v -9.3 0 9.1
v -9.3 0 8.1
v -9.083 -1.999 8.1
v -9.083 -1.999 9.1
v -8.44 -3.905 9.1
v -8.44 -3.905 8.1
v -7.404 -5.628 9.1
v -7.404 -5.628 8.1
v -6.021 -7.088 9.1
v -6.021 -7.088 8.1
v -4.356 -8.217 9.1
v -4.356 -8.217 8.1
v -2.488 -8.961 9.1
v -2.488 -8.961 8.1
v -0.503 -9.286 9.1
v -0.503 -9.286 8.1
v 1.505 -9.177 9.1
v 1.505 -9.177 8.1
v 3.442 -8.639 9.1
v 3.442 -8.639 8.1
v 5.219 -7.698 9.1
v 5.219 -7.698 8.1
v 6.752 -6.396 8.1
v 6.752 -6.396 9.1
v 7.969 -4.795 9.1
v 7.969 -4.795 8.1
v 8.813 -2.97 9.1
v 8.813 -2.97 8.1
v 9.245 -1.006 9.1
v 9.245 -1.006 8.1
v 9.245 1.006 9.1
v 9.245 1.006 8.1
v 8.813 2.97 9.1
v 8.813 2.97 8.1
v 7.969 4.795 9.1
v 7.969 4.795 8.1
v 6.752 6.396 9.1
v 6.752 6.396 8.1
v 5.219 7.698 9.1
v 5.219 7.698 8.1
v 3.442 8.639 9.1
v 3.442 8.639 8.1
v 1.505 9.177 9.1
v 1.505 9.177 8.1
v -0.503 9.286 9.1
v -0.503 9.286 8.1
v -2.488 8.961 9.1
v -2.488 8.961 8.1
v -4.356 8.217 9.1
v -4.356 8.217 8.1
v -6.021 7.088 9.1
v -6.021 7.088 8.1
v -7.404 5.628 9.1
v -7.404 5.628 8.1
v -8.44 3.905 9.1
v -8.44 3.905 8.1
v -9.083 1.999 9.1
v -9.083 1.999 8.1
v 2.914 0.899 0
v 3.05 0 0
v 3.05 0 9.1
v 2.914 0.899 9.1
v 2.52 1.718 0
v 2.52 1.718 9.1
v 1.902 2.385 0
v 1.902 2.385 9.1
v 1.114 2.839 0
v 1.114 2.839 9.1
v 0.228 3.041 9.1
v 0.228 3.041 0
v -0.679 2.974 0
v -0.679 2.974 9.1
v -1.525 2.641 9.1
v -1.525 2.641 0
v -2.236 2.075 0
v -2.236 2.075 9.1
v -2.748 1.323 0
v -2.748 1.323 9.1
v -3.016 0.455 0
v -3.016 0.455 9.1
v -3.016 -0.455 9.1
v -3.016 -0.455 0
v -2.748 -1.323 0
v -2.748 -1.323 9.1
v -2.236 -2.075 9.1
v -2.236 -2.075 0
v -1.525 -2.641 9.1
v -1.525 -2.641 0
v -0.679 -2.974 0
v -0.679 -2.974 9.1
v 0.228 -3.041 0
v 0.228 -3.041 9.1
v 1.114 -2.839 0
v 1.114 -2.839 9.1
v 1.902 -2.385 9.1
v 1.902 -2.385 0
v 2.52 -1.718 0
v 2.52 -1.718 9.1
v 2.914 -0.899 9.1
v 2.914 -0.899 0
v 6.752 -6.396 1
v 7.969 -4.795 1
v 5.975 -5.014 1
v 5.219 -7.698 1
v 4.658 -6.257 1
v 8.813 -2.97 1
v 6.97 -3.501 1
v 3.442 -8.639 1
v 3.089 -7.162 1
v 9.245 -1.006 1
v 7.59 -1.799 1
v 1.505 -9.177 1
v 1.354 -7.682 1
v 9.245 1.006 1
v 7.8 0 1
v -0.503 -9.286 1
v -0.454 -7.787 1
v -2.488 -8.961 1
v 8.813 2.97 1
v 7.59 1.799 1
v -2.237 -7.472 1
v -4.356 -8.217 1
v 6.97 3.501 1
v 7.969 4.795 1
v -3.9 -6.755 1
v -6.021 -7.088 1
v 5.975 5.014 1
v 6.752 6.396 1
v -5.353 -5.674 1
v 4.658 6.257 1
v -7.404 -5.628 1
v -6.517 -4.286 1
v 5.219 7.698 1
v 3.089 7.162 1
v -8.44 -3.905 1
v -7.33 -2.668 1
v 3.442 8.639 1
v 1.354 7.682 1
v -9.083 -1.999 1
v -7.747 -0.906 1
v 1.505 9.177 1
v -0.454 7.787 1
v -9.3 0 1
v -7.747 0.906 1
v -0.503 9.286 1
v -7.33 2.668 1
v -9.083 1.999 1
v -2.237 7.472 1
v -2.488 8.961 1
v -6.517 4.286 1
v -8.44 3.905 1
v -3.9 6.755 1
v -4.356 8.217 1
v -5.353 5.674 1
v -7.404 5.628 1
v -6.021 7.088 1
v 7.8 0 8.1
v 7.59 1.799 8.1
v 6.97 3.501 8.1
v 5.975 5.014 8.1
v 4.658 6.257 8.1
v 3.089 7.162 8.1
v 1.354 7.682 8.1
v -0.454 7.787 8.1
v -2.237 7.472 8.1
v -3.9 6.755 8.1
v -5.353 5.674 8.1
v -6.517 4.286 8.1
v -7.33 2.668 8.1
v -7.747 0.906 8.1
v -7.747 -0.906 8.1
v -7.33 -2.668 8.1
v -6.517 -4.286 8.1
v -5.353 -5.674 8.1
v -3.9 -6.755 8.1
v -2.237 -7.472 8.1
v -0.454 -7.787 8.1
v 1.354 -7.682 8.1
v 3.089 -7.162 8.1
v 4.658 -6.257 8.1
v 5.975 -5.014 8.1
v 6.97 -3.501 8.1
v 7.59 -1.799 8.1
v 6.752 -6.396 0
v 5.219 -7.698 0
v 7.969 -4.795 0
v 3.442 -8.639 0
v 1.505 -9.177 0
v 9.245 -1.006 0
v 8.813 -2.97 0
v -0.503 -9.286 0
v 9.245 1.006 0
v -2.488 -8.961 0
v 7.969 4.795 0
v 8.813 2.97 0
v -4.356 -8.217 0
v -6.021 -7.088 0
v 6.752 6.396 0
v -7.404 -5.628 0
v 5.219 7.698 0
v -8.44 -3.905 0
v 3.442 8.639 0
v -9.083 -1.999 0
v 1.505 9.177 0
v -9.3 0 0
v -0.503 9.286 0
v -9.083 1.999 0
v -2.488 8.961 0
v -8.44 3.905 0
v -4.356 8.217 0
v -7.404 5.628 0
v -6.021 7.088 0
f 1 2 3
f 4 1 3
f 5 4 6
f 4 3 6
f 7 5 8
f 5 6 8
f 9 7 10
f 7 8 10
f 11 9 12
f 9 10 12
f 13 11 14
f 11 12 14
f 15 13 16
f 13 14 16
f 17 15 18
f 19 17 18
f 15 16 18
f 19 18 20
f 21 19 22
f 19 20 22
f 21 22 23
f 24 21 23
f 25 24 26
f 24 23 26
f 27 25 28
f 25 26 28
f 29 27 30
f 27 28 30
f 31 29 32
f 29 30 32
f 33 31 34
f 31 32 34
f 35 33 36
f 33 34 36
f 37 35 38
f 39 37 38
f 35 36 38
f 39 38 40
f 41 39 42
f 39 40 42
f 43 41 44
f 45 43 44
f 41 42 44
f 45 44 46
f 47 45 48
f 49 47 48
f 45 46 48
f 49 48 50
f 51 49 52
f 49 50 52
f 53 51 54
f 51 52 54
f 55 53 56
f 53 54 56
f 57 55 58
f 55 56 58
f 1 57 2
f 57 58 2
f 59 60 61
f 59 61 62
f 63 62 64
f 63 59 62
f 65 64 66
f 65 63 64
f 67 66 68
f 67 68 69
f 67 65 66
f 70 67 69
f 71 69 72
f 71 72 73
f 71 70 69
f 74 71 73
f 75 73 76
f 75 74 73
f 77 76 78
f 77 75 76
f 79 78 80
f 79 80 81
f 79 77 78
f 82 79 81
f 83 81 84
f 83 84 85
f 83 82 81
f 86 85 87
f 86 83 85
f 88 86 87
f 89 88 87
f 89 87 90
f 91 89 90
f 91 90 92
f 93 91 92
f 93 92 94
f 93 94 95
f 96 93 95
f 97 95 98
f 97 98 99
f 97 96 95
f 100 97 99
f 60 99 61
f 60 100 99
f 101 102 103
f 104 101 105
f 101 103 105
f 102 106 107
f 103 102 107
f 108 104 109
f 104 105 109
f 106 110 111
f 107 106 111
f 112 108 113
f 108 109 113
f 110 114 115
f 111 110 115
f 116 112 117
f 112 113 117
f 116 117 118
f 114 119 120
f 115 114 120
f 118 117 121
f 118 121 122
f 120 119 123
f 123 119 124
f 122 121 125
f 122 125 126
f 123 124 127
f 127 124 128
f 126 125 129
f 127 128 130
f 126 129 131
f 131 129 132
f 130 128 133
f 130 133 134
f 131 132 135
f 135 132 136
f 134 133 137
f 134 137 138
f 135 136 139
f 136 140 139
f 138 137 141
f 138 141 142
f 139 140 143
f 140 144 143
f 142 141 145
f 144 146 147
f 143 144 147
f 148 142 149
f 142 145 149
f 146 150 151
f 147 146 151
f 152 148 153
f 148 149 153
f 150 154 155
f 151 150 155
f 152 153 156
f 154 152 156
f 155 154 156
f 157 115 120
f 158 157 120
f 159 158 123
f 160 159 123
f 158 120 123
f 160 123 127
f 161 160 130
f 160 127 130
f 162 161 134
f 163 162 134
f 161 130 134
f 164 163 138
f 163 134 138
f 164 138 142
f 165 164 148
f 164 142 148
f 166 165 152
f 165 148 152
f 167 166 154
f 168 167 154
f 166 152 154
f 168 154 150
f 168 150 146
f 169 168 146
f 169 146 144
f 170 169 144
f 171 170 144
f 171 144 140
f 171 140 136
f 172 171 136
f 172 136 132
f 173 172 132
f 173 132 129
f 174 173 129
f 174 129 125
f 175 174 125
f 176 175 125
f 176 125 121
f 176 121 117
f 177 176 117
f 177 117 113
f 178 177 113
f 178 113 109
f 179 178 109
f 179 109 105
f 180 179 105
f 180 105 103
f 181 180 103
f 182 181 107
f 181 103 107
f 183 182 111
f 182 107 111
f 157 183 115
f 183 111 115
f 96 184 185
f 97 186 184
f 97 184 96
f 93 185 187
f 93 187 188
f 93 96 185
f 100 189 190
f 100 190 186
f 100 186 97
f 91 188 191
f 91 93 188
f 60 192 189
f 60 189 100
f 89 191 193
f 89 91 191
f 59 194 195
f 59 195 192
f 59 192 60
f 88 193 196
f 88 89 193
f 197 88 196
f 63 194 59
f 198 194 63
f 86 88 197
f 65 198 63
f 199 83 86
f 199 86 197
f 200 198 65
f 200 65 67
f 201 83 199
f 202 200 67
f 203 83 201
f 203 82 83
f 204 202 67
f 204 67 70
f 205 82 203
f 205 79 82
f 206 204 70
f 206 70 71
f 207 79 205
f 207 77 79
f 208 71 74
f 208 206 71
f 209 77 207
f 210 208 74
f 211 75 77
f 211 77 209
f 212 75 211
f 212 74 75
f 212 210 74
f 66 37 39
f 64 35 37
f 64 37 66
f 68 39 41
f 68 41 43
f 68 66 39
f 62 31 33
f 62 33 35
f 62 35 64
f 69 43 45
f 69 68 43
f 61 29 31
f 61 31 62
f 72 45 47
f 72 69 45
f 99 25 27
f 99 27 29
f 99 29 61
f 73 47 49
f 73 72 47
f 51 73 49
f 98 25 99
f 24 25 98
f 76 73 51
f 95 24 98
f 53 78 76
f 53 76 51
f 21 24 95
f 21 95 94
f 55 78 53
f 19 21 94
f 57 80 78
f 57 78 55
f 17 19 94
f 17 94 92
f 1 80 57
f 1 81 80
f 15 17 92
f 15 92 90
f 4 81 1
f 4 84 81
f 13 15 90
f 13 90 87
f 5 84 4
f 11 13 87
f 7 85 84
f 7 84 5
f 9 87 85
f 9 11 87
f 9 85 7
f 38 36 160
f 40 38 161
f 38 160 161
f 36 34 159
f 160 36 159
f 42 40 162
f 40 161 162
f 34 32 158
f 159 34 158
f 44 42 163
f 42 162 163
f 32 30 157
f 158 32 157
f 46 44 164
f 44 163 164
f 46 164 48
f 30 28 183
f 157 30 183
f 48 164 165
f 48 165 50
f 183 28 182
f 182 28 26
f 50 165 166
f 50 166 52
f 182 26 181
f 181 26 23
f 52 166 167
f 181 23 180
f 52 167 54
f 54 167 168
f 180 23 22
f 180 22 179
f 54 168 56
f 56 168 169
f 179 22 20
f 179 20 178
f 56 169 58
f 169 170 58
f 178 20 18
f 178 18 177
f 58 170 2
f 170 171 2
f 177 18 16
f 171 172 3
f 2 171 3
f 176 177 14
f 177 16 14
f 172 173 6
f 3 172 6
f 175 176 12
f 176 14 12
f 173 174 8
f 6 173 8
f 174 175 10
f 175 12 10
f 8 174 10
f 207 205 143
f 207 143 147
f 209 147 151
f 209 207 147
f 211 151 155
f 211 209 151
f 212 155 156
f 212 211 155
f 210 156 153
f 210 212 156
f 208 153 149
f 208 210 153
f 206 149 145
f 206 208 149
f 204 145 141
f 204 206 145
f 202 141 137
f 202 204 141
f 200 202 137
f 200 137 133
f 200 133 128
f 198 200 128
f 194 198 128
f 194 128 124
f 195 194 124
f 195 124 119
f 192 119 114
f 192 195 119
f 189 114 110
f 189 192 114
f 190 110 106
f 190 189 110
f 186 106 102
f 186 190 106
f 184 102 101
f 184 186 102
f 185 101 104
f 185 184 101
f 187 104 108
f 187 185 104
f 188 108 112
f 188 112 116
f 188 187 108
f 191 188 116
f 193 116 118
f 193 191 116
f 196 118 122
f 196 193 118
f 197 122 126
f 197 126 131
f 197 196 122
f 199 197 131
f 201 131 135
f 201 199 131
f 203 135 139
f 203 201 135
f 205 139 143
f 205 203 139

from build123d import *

# Parameters (mm, degrees)
ESBO_O1_R                = 7.8
ESBO_O1_R_2              = 3.05
RESSALTO_EXTRUS_O1_DEPTH = 9.1
ESBO_O2_R                = 9.3
ESBO_O2_R_2              = 7.8
RESSALTO_EXTRUS_O2_DEPTH = 1
RESSALTO_EXTRUS_O3_START = -1
ESBO_O3_R                = 9.3
ESBO_O3_R_2              = 7.8
RESSALTO_EXTRUS_O3_DEPTH = 1


with BuildPart() as part:
    # Esboço1 → Ressalto-extrusão1 (new body)
    with BuildSketch(Plane.XY):
        Circle(ESBO_O1_R)
        Circle(ESBO_O1_R_2, mode=Mode.SUBTRACT)
    extrude(amount=RESSALTO_EXTRUS_O1_DEPTH)

    # Esboço2 → Ressalto-extrusão2 (add)
    with BuildSketch(Plane(origin=(0, 0, 0), x_dir=(-1, 0, 0), z_dir=(0, 0, -1))):
        Circle(ESBO_O2_R)
        Circle(ESBO_O2_R_2, mode=Mode.SUBTRACT)
    extrude(amount=-RESSALTO_EXTRUS_O2_DEPTH)

    # Esboço3 → Ressalto-extrusão3 (add)
    with BuildSketch(Plane.XY.offset(9.1).offset(RESSALTO_EXTRUS_O3_START)):
        with Locations(Location((0, 0, 0), (0, 0, 180))):
            Circle(ESBO_O3_R)
        with Locations(Location((0, 0, 0), (0, 0, 180))):
            Circle(ESBO_O3_R_2, mode=Mode.SUBTRACT)
    extrude(amount=RESSALTO_EXTRUS_O3_DEPTH)


solid = part.part
